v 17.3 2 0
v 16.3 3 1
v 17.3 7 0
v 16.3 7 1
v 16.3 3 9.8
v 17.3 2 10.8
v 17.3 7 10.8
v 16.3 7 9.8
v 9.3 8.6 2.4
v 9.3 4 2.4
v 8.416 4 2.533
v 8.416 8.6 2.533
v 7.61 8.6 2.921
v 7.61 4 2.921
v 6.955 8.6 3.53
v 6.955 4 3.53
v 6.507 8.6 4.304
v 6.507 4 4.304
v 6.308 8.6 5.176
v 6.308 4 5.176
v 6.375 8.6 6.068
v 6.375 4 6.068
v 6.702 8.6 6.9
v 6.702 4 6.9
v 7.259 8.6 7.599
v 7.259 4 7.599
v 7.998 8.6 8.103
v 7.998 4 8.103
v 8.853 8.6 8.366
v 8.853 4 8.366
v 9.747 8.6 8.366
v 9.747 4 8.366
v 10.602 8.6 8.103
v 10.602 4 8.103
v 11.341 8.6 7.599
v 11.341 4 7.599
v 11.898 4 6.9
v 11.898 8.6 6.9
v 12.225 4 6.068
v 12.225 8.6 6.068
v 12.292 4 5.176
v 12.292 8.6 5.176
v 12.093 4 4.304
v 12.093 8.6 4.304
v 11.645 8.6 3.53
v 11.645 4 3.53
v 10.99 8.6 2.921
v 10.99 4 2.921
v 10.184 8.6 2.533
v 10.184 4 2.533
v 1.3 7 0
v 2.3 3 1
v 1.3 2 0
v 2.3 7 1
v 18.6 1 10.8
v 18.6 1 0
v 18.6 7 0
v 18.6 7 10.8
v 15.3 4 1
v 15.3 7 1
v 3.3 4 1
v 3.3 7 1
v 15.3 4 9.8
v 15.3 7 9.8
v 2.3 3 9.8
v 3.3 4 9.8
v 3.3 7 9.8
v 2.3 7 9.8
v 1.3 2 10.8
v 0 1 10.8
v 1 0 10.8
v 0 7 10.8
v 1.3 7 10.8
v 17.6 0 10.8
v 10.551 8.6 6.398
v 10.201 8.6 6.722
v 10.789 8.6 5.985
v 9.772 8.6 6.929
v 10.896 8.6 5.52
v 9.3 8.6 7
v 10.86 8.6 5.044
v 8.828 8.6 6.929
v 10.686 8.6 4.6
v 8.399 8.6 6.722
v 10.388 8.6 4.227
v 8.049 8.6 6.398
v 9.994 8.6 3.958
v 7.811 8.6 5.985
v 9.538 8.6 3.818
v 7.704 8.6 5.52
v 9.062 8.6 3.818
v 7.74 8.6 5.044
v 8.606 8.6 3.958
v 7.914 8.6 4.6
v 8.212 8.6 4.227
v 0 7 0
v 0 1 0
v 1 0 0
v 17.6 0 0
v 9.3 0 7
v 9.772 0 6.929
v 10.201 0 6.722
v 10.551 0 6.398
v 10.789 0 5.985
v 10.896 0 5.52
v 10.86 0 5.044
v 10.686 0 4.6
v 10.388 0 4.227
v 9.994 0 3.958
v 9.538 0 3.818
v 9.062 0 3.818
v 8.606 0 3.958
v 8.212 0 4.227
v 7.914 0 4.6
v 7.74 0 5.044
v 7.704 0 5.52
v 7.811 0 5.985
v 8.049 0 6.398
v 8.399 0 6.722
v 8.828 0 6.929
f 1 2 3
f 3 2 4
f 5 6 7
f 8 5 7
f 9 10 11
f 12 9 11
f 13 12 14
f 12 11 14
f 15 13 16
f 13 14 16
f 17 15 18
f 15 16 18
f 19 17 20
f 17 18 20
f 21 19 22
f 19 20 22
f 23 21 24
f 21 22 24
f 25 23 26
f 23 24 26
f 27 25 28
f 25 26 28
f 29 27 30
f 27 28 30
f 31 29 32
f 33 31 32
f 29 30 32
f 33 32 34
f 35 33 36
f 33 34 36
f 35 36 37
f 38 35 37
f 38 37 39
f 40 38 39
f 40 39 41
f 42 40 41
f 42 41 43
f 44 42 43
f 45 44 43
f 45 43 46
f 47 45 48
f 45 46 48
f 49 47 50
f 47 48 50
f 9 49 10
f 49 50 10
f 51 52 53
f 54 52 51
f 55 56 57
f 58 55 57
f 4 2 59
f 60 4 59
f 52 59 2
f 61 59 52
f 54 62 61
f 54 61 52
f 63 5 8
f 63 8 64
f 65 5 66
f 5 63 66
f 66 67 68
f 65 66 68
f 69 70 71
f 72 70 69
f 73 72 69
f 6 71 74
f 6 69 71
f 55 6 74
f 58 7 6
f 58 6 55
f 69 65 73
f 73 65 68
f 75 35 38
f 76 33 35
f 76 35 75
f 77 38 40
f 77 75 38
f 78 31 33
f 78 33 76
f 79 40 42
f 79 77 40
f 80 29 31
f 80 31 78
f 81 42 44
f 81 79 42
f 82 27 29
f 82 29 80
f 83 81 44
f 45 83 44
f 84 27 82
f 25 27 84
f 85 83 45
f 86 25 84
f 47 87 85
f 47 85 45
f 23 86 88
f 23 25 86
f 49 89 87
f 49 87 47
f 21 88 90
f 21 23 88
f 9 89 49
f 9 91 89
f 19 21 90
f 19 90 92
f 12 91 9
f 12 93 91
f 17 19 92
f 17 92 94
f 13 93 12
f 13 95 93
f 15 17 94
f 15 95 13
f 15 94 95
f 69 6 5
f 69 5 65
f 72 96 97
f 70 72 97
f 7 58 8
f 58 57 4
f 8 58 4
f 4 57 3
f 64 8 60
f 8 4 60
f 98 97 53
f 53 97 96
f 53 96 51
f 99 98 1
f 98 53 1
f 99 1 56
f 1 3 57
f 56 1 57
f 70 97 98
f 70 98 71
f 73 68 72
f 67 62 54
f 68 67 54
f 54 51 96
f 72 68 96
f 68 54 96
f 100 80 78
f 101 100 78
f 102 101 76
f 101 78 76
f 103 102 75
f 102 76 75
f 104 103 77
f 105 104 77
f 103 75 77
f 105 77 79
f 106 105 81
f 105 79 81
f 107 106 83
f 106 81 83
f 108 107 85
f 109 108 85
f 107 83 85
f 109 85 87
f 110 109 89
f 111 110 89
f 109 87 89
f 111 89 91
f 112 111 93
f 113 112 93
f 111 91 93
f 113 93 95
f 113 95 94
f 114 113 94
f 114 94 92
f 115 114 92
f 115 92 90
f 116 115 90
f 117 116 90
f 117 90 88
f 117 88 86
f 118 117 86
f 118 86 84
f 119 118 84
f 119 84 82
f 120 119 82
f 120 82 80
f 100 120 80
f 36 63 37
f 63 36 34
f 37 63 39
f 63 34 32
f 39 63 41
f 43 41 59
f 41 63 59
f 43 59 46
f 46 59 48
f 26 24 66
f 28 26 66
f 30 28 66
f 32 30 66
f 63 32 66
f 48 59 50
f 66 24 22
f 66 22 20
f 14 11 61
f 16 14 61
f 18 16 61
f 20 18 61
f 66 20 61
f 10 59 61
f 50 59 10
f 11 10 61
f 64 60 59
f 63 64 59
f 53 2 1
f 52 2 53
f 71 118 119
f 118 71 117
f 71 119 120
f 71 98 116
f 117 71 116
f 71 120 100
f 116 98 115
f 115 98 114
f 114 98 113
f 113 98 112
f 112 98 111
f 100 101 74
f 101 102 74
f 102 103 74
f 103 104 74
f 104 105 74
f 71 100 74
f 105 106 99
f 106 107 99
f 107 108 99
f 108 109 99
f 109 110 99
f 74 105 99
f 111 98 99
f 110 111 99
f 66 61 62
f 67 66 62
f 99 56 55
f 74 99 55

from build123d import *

# Parameters (mm, degrees)
BOSS_EXTRUDE1_DEPTH      = 10.8
SKETCH2_R                = 3
BOSS_EXTRUDE2_DEPTH      = 4.6
SKETCH3_R                = 1.6
CUT_EXTRUDE1_DEPTH       = 24.163764806
CHAMFER1_SIZE            = 1
SKETCH4_W                = 16
SKETCH4_H                = 5
CUT_EXTRUDE2_DEPTH       = 1
CHAMFER2_SIZE            = 1
CHAMFER2_OF_MIRROR1_SIZE = 1


with BuildPart() as part:
    # Sketch1 → Boss-Extrude1 (new body)
    with BuildSketch(Plane.XY):
        Polygon((0, 0), (18.6, 0), (18.6, 7), (15.3, 7), (15.3, 4), (3.3, 4), (3.3, 7), (0, 7), align=None)
    extrude(amount=BOSS_EXTRUDE1_DEPTH)

    # Sketch2 → Boss-Extrude2 (add)
    with BuildSketch(Plane(origin=(0, 4, 0), x_dir=(1, 0, 0), z_dir=(0, 1, 0))):
        with Locations(Location((9.3, -5.4, 0), (0, 0, 90))):
            Circle(SKETCH2_R)
    extrude(amount=BOSS_EXTRUDE2_DEPTH)

    # Sketch3 → Cut-Extrude1 (cut, through all)
    with BuildSketch(Plane(origin=(0, 8.6, 0), x_dir=(1, 0, 0), z_dir=(0, 1, 0))):
        with Locations(Location((9.3, -5.4, 0), (0, 0, 270))):
            Circle(SKETCH3_R)
    extrude(amount=-CUT_EXTRUDE1_DEPTH, mode=Mode.SUBTRACT)

    # Chamfer1
    chamfer1_edges = [part.edges().sort_by_distance(p)[0] for p in [
        (18.6, 0, 5.4),
        (0, 0, 5.4),
    ]]
    chamfer(chamfer1_edges, length=CHAMFER1_SIZE)

    # Sketch4 → Cut-Extrude2 (cut)
    with BuildSketch(Plane(origin=(0, 0, 0), x_dir=(-1, 0, 0), z_dir=(0, 0, -1))):
        with Locations((-9.3, 4.5)):
            Rectangle(SKETCH4_W, SKETCH4_H)
    cut_extrude2 = extrude(amount=-CUT_EXTRUDE2_DEPTH, mode=Mode.SUBTRACT)

    # Chamfer2
    chamfer2_edges = [part.edges().sort_by_distance(p)[0] for p in [
        (1.3, 4.5, 1),
        (17.3, 4.5, 1),
        (9.3, 2, 1),
    ]]
    chamfer(chamfer2_edges, length=CHAMFER2_SIZE - 0.0001)  # a hair under: the kernel refuses the full size

    # Mirror1: Cut-Extrude2 across plane
    add(cut_extrude2.mirror(Plane(origin=(0, 0, 5.4), x_dir=(1, 0, 0), z_dir=(0, 0, -1))), mode=Mode.SUBTRACT)

    # Chamfer2 of Mirror1
    chamfer2_of_mirror1_edges = [part.edges().sort_by_distance(p)[0] for p in [
        (1.3, 4.5, 9.8),
        (17.3, 4.5, 9.8),
        (9.3, 2, 9.8),
    ]]
    chamfer(chamfer2_of_mirror1_edges, length=CHAMFER2_OF_MIRROR1_SIZE - 0.0001)  # a hair under: the kernel refuses the full size


solid = part.part
